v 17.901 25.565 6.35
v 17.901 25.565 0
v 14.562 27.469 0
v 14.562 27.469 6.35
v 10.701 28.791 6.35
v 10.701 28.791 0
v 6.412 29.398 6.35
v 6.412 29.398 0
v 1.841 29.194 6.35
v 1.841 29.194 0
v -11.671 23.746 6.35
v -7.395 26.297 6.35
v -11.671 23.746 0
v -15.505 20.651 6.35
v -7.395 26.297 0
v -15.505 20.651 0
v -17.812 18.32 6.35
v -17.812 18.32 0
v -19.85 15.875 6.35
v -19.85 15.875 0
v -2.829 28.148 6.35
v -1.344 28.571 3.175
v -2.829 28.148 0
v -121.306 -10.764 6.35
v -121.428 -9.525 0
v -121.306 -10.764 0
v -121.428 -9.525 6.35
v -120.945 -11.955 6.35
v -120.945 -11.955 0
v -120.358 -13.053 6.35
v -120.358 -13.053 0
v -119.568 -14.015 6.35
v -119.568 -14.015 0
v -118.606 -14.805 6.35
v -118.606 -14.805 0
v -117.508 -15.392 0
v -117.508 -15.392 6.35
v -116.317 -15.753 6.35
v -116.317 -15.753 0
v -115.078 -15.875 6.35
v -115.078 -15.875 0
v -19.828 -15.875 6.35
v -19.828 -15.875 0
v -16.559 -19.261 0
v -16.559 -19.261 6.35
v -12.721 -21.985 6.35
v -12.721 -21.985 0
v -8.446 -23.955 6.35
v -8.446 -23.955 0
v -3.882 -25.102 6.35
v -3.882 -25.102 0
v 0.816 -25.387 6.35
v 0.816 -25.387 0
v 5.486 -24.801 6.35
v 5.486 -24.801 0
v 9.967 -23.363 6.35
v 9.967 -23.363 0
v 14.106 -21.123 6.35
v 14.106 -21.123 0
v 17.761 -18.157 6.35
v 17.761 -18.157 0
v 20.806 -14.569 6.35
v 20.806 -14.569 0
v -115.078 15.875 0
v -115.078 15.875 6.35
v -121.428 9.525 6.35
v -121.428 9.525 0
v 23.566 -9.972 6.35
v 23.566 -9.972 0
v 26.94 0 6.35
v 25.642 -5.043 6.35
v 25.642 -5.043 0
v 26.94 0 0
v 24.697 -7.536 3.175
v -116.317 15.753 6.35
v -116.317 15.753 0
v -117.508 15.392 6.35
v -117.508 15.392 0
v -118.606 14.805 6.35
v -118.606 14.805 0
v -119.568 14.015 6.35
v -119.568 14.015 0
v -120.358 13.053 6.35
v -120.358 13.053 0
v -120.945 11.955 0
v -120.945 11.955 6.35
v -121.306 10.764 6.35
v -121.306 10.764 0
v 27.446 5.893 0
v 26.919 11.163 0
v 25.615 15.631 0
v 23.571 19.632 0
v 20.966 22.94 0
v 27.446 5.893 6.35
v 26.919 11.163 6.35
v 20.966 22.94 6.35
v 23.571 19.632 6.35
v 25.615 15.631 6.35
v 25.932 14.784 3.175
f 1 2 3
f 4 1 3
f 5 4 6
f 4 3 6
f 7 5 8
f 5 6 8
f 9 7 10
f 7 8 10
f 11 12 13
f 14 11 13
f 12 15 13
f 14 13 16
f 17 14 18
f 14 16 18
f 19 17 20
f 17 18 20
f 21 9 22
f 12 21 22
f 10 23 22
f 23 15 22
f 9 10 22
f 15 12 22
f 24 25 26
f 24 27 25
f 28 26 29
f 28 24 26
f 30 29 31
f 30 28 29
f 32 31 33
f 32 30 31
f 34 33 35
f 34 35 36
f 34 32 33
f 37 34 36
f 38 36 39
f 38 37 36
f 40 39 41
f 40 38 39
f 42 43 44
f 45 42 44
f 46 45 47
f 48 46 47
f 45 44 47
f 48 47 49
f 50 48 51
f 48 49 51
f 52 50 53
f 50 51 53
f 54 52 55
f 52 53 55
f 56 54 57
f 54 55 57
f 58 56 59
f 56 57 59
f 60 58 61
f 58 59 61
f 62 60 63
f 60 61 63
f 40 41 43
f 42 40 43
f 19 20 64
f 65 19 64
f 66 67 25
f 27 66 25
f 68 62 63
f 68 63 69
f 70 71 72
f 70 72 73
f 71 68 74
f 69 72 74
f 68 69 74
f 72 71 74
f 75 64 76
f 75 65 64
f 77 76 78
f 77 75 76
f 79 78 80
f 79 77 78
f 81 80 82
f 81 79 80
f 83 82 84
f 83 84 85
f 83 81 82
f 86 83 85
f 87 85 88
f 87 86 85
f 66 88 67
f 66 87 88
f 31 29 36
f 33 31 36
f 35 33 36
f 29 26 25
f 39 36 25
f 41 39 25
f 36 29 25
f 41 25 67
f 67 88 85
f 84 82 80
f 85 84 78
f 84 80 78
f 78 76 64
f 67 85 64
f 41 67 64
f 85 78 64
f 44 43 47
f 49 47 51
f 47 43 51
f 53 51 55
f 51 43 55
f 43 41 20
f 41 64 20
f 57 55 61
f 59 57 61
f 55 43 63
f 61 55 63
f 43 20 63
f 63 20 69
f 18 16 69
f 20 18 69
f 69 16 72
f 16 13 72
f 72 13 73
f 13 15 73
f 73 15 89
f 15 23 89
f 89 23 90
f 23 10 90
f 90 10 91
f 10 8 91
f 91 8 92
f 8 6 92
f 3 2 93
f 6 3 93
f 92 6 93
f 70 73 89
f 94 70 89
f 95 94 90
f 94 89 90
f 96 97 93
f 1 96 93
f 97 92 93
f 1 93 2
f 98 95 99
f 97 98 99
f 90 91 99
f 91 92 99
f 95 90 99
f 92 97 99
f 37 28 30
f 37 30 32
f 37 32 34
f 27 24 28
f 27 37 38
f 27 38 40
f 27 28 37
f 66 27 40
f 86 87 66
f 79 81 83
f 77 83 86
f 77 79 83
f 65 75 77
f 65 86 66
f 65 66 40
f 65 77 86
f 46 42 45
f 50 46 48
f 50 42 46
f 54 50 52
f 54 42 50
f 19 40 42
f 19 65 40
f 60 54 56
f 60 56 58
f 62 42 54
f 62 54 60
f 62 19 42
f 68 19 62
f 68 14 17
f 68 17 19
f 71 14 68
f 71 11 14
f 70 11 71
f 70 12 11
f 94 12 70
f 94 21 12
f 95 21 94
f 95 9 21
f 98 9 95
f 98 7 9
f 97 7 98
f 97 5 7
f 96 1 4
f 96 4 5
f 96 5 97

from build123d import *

# Parameters (mm, degrees)
F1_DEPTH = 6.35
F2_R     = 6.35


with BuildPart() as f1:
    # F0 (on Top) → F1 (new body)
    with BuildSketch(Plane.XY):
        with BuildLine():
            add(Edge.make_bspline(
                [(-19.8501589651, 15.875), (-20.3419955534, 15.232168206), (-20.8064619249, 14.5688414833)],
                knots=[1.5189156006, 1.5189156006, 1.5189156006, 1.5707963268, 1.5707963268, 1.5707963268], degree=2, weights=[1, 0.9996635676, 1]))
            ThreePointArc((-20.8064619249, 14.5688414833), (-25.386887881, -0.8160414938), (-19.8278686449, -15.875))
            ThreePointArc((-19.8278686449, -15.875), (0.8160414938, -25.386887881), (20.8064619249, -14.5688414833))
            add(Edge.make_bspline(
                [(20.8064619249, -14.5688414833), (25.5490601214, -7.7957093222), (26.9403423198, 0)],
                knots=[4.7123889804, 4.7123889804, 4.7123889804, 5.2303546369, 5.2303546369, 5.2303546369], degree=2, weights=[1, 0.9666509732, 1]))
            add(Edge.make_bspline(
                [(26.9403423198, 0), (29.9920251657, 17.099358015), (17.9011443111, 25.5654838108)],
                knots=[5.2303546369, 5.2303546369, 5.2303546369, 6.2831853127, 6.2831853127, 6.2831853127], degree=2, weights=[1, 0.8646136894, 1]))
            add(Edge.make_bspline(
                [(17.9011443111, 25.5654838108), (-1.8529265857, 39.3974329633), (-19.8501589651, 15.875)],
                knots=[5.5e-09, 5.5e-09, 5.5e-09, 1.5189156006, 1.5189156006, 1.5189156006], degree=2, weights=[1, 0.7252094391, 1]))
        make_face()
        with BuildLine():
            ThreePointArc((-19.8278686449, -15.875), (-25.386887881, -0.8160414938), (-20.8064619249, 14.5688414833))
            add(Edge.make_bspline(
                [(-19.8501589651, 15.875), (-20.3419955534, 15.232168206), (-20.8064619249, 14.5688414833)],
                knots=[1.5189156006, 1.5189156006, 1.5189156006, 1.5707963268, 1.5707963268, 1.5707963268], degree=2, weights=[1, 0.9996635676, 1]))
            Line((-19.8501589651, 15.875), (-121.4278686449, 15.875))
            Line((-121.4278686449, 15.875), (-121.4278686449, -15.875))
            Line((-121.4278686449, -15.875), (-19.8278686449, -15.875))
        make_face()
    extrude(amount=F1_DEPTH)

    # F2
    f2_edges = [f1.edges().sort_by_distance(p)[0] for p in [
        (-121.427869, 15.875, 3.175),
        (-121.427869, -15.875, 3.175),
    ]]
    fillet(f2_edges, radius=F2_R)


solid = f1.part
